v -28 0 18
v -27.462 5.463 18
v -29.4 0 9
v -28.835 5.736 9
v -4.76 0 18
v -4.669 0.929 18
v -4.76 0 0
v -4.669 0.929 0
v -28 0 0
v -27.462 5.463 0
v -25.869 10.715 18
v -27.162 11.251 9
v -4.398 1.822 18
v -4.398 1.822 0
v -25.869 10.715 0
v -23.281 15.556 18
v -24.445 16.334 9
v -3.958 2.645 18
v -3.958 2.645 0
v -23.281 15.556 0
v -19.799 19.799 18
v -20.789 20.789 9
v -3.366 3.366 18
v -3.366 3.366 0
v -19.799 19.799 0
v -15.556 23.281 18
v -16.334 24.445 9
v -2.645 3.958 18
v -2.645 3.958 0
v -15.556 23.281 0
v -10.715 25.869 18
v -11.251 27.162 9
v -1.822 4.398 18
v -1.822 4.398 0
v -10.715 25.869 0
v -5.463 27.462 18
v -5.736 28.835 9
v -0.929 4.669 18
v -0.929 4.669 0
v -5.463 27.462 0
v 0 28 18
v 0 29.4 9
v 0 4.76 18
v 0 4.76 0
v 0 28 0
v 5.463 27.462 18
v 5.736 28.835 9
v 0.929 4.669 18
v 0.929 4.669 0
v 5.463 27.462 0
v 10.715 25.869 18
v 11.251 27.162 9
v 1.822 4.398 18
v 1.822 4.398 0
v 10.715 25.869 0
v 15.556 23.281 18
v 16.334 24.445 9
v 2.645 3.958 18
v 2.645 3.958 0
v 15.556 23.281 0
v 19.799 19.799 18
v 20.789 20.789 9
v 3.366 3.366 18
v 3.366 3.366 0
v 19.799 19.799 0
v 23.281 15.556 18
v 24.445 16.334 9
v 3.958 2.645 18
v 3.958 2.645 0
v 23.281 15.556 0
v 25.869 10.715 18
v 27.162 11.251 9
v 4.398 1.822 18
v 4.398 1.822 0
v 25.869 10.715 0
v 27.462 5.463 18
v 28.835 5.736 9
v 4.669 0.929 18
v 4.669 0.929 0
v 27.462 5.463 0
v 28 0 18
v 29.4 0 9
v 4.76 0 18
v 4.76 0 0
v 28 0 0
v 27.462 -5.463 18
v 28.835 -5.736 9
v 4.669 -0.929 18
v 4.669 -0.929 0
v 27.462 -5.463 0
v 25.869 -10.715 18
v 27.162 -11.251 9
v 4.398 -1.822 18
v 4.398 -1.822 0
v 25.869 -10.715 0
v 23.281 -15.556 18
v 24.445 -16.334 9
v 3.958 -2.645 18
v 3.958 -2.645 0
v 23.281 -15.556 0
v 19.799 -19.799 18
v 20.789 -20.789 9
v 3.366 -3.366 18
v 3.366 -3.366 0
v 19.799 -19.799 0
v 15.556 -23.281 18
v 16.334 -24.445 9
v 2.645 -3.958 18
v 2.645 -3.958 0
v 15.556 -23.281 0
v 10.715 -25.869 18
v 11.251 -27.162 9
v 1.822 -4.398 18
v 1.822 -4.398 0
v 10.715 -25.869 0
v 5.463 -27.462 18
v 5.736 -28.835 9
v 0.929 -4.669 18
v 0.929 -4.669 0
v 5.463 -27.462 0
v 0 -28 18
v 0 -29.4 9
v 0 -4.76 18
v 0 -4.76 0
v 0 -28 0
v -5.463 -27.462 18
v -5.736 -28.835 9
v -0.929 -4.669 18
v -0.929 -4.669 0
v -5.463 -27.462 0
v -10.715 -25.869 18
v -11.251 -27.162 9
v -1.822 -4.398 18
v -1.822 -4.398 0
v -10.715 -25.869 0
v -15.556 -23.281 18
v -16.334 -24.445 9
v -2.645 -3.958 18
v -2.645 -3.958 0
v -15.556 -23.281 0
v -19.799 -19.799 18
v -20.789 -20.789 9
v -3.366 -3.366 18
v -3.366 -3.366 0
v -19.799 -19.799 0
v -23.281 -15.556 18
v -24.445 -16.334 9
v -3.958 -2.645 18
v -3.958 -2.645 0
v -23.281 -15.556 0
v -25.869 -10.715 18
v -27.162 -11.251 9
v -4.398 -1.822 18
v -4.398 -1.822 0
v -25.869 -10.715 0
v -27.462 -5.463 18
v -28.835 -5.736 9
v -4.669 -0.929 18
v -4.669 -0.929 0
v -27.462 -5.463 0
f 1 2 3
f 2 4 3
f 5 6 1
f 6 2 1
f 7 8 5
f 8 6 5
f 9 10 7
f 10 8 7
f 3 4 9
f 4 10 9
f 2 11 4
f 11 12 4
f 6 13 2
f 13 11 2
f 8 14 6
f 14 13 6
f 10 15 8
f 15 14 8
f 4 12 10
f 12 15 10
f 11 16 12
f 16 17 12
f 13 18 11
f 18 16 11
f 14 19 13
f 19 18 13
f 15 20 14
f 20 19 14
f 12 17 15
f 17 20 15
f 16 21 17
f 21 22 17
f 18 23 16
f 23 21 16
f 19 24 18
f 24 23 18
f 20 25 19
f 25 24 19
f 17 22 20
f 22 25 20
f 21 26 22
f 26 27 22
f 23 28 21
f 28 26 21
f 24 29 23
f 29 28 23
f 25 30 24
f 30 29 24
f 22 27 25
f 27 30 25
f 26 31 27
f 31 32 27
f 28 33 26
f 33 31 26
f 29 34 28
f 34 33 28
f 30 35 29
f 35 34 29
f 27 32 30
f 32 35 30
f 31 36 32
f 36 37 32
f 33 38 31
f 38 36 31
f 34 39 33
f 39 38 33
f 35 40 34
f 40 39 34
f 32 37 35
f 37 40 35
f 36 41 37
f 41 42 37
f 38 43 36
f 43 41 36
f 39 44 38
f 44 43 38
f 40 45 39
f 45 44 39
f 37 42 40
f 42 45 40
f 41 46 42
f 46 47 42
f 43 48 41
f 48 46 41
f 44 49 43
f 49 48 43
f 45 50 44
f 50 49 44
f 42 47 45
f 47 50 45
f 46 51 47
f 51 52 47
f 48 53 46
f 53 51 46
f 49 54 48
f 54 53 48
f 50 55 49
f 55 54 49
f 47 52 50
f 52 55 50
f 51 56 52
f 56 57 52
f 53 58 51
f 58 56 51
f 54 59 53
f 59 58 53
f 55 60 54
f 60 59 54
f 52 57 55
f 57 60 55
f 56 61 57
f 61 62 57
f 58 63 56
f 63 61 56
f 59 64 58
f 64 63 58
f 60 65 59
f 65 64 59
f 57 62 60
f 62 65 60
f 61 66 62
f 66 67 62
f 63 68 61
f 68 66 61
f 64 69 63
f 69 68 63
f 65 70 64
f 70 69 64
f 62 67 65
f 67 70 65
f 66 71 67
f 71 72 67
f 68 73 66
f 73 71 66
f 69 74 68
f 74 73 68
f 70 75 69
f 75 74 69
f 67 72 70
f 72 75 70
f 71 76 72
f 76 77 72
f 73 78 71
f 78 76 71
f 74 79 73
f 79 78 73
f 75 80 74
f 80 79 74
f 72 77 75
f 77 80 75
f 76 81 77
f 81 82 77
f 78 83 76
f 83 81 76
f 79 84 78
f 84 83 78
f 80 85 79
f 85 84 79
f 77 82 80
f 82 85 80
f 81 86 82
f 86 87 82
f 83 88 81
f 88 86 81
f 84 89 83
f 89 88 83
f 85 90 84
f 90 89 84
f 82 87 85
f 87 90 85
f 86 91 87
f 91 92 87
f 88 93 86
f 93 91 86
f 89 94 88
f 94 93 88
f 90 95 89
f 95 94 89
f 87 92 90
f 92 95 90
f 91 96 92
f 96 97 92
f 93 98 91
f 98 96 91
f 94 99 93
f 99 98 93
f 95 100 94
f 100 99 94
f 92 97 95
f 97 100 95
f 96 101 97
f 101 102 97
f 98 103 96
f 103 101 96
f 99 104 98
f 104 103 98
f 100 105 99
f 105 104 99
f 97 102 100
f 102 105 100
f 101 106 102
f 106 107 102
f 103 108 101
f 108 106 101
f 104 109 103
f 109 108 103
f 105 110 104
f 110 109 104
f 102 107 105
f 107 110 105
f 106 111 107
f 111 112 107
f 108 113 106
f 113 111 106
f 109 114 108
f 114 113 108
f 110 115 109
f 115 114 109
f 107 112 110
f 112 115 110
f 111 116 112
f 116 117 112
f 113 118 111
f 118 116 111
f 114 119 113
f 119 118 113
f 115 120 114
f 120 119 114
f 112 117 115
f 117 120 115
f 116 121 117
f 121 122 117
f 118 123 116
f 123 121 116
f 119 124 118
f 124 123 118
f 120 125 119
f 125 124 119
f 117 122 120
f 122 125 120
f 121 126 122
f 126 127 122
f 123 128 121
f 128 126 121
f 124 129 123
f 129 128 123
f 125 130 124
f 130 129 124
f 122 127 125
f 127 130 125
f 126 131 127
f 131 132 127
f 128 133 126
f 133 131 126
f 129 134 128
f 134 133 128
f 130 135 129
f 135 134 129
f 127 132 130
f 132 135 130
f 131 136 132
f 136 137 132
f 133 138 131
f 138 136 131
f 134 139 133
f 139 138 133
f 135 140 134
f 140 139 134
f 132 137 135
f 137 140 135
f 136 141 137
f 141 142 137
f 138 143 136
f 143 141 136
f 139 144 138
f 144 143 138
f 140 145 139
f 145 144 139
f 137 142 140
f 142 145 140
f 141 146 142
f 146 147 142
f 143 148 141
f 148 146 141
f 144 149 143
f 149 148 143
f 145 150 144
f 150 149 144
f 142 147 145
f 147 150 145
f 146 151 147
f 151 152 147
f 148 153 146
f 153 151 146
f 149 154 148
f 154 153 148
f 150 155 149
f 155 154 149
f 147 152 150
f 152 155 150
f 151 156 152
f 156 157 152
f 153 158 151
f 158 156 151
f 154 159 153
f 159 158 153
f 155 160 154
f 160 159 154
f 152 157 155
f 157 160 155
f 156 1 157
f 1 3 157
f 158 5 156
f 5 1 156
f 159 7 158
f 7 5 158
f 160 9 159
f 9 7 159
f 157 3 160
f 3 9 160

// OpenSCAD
$fn = 32;

// ----------------------------------------------------------------------
// Belt roller: 56 mm barrel, 18 mm wide, bore 9.52 mm
// ----------------------------------------------------------------------

// --- parameters (mm) ---
bore_d = 9.52;            // bore
barrel_d = 56;            // barrel diameter
roller_w = 18;            // roller width
crown = 1.4;              // crown height at mid width

roller_profile = [[4.76, 0], [28, 0], [29.4, 9], [28, 18], [4.76, 18]];

/* the profile stays clear of the axis, so the bore comes out of the revolve */
rotate_extrude() polygon(roller_profile);
